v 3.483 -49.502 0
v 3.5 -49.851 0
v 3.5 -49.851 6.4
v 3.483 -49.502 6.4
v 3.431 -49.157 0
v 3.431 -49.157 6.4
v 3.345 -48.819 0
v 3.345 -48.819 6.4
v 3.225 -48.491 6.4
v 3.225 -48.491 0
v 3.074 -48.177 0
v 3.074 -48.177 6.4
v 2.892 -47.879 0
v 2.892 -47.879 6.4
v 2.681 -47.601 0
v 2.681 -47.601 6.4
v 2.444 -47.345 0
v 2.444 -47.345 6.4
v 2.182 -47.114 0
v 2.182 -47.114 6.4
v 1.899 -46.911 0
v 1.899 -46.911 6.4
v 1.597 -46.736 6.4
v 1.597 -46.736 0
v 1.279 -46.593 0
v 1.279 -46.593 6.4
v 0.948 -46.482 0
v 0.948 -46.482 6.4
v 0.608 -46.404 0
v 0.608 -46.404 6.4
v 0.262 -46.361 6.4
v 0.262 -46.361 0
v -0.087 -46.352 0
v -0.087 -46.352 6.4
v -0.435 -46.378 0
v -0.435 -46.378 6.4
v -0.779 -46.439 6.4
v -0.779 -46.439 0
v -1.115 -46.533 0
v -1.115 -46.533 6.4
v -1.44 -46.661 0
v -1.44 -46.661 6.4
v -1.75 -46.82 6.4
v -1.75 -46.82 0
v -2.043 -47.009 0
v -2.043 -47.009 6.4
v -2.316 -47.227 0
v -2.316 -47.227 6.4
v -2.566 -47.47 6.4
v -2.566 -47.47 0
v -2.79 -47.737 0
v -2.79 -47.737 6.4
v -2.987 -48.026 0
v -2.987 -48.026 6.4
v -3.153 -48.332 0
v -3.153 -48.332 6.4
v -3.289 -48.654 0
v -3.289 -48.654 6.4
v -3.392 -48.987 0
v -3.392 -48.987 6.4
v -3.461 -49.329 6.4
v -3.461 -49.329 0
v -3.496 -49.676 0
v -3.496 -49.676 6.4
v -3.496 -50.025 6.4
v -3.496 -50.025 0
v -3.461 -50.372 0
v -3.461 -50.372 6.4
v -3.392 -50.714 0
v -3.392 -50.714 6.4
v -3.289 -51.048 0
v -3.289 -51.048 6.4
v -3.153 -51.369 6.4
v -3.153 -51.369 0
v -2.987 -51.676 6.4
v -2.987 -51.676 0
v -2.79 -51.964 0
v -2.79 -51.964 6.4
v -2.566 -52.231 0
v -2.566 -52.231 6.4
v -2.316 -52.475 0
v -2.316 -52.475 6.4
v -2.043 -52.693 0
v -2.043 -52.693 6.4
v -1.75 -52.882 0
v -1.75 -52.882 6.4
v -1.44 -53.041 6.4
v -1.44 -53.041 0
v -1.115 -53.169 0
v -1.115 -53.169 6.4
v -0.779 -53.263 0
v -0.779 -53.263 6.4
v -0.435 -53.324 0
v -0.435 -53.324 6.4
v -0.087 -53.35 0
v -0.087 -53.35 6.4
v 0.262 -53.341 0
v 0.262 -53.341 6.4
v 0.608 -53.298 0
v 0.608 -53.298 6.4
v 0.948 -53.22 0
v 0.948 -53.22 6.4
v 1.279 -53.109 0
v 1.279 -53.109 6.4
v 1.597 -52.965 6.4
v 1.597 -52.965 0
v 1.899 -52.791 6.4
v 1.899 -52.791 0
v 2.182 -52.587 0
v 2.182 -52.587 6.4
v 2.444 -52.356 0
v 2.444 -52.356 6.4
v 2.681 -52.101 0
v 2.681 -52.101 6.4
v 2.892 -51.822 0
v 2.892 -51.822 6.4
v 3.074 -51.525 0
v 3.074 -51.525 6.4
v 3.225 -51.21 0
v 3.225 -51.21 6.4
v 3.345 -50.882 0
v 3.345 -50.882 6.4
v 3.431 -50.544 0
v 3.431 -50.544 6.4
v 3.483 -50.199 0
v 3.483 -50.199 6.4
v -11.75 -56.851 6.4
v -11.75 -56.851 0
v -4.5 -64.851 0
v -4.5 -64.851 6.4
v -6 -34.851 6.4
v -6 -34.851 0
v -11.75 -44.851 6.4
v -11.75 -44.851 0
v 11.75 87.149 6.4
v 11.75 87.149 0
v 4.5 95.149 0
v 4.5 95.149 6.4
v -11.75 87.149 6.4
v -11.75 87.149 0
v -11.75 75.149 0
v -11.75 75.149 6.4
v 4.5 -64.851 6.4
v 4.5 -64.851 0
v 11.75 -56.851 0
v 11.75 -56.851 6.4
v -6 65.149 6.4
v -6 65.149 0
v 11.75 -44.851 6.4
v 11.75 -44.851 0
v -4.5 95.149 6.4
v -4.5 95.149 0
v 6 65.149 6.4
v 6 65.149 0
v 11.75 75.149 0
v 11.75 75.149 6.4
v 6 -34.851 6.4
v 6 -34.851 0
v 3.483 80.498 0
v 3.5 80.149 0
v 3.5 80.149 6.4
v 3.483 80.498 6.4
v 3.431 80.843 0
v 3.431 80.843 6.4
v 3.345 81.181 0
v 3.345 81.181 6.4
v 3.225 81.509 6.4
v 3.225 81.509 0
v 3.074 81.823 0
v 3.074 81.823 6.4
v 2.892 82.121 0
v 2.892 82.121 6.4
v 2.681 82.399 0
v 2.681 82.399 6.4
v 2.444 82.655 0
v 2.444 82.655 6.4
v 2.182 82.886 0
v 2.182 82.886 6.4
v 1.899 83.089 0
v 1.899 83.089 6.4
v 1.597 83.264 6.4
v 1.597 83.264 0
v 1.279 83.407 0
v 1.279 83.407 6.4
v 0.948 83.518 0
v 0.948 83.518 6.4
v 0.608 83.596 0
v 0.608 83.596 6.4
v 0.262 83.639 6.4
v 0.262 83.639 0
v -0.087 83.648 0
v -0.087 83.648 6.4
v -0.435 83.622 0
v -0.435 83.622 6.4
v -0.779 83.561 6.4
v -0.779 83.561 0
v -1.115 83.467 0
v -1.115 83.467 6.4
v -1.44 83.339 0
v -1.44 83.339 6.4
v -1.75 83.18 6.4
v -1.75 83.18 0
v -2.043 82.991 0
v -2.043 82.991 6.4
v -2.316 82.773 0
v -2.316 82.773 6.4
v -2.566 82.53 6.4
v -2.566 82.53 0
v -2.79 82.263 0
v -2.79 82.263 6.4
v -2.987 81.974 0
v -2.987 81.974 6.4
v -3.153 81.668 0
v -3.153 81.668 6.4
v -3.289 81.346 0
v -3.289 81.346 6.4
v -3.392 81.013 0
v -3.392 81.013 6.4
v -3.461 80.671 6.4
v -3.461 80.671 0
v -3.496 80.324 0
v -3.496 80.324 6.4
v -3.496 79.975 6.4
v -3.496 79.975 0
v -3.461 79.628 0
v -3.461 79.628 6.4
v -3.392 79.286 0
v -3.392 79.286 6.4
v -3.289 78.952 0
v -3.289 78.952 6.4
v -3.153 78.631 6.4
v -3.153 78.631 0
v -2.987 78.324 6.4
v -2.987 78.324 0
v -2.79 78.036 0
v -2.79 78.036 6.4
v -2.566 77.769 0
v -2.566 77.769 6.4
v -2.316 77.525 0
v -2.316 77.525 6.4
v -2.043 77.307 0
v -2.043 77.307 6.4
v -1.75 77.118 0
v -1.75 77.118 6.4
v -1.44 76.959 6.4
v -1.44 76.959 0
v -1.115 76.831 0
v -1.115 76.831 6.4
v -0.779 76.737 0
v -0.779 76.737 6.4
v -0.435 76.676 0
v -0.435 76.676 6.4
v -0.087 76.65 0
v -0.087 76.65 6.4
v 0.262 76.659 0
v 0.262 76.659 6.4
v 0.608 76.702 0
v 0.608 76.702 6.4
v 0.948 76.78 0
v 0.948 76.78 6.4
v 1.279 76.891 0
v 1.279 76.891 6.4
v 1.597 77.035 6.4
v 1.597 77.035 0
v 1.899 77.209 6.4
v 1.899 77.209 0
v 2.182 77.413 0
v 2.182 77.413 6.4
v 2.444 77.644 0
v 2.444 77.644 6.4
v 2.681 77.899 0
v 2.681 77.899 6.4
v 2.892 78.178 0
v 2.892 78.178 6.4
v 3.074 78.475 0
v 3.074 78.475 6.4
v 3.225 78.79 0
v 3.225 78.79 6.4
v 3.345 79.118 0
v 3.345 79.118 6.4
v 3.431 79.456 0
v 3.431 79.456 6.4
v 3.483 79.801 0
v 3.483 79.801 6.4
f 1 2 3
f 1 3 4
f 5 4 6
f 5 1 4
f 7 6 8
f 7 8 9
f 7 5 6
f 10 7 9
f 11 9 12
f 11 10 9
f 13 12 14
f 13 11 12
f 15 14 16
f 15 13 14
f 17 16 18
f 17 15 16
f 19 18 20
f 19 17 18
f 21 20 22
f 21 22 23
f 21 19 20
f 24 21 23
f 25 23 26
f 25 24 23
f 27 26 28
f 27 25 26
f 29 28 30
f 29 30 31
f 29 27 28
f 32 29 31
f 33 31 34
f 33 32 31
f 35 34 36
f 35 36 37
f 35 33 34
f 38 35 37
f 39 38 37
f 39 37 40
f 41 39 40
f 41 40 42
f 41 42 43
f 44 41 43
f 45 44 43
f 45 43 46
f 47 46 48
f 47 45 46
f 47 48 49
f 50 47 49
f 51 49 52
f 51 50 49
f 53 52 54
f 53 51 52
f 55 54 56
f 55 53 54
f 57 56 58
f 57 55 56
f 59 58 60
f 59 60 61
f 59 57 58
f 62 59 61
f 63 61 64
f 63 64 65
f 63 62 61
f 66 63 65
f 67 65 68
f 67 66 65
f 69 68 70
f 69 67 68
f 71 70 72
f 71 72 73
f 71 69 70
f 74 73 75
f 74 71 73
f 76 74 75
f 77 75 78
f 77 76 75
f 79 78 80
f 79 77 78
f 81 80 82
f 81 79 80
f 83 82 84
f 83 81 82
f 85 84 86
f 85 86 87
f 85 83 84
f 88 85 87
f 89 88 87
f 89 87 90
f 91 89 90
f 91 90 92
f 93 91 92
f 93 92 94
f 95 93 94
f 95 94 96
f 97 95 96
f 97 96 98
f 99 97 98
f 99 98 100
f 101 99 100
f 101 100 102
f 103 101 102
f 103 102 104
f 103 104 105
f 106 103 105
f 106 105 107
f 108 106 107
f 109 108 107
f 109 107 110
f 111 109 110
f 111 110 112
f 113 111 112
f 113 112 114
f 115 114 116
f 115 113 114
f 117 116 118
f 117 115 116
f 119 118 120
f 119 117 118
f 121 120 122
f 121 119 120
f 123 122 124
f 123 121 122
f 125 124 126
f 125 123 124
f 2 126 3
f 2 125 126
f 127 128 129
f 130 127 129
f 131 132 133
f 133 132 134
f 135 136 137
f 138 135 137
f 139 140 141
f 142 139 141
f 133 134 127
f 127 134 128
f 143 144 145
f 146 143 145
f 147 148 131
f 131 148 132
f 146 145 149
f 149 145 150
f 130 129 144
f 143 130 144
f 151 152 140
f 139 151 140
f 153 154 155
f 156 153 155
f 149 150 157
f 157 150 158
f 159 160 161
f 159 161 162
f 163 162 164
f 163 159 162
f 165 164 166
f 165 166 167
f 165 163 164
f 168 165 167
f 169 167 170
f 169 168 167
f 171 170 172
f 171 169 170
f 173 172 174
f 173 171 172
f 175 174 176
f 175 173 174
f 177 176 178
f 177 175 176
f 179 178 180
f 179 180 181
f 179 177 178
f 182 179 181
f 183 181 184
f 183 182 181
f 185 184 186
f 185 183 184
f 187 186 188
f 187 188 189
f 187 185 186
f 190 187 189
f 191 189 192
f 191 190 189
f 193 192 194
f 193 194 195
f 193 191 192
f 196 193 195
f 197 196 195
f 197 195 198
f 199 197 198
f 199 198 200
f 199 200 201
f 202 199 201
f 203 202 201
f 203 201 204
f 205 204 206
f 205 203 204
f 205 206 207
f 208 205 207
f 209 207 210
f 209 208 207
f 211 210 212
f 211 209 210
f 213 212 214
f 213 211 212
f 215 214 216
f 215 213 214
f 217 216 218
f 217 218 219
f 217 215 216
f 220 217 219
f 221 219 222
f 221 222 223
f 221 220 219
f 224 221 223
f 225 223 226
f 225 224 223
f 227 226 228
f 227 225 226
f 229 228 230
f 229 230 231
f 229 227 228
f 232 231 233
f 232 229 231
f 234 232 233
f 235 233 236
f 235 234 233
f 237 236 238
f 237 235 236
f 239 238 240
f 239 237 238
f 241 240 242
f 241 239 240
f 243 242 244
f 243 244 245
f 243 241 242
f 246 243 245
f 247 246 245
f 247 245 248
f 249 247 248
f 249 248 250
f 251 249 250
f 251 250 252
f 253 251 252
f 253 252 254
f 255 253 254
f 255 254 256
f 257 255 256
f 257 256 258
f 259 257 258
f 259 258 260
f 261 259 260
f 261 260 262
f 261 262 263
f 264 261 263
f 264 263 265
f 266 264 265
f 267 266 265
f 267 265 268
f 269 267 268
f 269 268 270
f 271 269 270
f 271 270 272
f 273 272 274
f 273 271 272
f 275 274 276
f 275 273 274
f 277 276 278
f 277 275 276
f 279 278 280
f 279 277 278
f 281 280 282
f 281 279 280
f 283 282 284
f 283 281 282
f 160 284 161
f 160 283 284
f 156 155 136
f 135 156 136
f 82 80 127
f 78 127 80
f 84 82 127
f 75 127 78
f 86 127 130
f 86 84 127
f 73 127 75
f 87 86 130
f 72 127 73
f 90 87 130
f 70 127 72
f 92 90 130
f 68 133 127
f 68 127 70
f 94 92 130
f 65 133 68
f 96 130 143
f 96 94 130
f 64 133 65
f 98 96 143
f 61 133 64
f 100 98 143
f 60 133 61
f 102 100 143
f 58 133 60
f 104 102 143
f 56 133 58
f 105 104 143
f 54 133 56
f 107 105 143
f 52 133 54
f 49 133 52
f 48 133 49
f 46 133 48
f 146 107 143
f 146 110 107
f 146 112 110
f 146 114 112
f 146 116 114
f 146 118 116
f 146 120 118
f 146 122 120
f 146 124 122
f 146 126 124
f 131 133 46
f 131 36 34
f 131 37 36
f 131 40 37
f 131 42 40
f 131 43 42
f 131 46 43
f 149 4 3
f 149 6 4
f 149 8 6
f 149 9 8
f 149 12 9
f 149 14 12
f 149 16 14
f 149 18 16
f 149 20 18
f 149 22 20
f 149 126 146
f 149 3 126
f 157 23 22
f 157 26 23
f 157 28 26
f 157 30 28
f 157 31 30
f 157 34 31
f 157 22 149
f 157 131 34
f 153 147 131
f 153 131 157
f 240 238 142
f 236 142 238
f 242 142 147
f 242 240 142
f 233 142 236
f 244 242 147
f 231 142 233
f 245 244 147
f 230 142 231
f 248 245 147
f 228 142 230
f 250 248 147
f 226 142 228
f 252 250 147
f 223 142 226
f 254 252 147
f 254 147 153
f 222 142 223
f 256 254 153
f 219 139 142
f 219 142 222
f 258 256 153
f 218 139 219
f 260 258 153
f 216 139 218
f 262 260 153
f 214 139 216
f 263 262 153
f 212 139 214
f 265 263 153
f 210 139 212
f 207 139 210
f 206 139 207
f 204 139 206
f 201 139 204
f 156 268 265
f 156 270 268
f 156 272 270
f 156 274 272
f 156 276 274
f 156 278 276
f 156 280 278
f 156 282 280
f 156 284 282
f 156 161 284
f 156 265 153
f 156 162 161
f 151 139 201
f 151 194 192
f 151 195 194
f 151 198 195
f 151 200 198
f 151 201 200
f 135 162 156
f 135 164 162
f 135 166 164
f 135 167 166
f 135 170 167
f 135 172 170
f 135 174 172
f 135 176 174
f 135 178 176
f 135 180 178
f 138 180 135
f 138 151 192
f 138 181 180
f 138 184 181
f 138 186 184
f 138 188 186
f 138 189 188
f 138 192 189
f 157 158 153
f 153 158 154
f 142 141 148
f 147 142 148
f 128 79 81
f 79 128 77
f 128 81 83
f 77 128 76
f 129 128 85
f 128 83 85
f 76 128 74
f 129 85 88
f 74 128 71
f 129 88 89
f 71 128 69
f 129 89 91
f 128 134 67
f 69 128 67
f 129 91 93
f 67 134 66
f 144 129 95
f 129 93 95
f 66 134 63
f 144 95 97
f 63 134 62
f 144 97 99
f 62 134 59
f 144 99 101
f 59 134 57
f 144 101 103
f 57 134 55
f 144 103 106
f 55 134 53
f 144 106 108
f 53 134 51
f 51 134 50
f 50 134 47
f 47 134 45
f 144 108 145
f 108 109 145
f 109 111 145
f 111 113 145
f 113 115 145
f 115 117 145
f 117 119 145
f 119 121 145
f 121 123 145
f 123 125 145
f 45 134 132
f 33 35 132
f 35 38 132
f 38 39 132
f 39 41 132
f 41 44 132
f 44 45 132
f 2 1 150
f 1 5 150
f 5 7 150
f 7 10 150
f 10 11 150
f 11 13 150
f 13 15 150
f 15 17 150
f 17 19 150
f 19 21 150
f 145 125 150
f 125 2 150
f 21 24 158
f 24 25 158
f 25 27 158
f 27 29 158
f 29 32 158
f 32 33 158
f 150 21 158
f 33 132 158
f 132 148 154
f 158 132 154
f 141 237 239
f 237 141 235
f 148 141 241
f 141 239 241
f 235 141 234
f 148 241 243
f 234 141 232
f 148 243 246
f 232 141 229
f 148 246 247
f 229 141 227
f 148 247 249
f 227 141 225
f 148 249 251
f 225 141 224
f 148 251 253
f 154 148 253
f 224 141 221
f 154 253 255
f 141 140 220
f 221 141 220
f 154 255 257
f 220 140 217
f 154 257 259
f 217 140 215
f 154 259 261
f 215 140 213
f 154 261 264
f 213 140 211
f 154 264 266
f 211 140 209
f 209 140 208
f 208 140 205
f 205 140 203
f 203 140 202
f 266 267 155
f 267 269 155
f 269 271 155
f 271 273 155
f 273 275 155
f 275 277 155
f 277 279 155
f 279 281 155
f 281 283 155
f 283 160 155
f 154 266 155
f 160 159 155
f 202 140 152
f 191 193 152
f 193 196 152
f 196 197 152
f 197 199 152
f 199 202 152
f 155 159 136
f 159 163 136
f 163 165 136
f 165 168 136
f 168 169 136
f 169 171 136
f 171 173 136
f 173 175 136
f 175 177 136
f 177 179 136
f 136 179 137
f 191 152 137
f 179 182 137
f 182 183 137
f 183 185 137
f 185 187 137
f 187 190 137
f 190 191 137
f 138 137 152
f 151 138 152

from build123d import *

# Parameters (mm, degrees)
CROQUIS1_R              = 3.5
SALIENTE_EXTRUIR1_DEPTH = 6.4


with BuildPart() as part:
    # Croquis1 → Saliente-Extruir1 (new body)
    with BuildSketch(Plane.XY):
        Polygon((-6, 15.149188933), (-6, -34.850811067), (-11.75, -44.850811067), (-11.75, -56.850811067), (-4.5, -64.850811067), (4.5, -64.850811067), (11.75, -56.850811067), (11.75, -44.850811067), (6, -34.850811067), (6, 15.149188933), (6, 65.149188933), (11.75, 75.149188933), (11.75, 87.149188933), (4.5, 95.149188933), (-4.5, 95.149188933), (-11.75, 87.149188933), (-11.75, 75.149188933), (-6, 65.149188933), align=None)
        with Locations((0, -49.850811067)):
            Circle(CROQUIS1_R, mode=Mode.SUBTRACT)
        with Locations((0, 80.149188933)):
            Circle(CROQUIS1_R, mode=Mode.SUBTRACT)
    extrude(amount=SALIENTE_EXTRUIR1_DEPTH)


solid = part.part
